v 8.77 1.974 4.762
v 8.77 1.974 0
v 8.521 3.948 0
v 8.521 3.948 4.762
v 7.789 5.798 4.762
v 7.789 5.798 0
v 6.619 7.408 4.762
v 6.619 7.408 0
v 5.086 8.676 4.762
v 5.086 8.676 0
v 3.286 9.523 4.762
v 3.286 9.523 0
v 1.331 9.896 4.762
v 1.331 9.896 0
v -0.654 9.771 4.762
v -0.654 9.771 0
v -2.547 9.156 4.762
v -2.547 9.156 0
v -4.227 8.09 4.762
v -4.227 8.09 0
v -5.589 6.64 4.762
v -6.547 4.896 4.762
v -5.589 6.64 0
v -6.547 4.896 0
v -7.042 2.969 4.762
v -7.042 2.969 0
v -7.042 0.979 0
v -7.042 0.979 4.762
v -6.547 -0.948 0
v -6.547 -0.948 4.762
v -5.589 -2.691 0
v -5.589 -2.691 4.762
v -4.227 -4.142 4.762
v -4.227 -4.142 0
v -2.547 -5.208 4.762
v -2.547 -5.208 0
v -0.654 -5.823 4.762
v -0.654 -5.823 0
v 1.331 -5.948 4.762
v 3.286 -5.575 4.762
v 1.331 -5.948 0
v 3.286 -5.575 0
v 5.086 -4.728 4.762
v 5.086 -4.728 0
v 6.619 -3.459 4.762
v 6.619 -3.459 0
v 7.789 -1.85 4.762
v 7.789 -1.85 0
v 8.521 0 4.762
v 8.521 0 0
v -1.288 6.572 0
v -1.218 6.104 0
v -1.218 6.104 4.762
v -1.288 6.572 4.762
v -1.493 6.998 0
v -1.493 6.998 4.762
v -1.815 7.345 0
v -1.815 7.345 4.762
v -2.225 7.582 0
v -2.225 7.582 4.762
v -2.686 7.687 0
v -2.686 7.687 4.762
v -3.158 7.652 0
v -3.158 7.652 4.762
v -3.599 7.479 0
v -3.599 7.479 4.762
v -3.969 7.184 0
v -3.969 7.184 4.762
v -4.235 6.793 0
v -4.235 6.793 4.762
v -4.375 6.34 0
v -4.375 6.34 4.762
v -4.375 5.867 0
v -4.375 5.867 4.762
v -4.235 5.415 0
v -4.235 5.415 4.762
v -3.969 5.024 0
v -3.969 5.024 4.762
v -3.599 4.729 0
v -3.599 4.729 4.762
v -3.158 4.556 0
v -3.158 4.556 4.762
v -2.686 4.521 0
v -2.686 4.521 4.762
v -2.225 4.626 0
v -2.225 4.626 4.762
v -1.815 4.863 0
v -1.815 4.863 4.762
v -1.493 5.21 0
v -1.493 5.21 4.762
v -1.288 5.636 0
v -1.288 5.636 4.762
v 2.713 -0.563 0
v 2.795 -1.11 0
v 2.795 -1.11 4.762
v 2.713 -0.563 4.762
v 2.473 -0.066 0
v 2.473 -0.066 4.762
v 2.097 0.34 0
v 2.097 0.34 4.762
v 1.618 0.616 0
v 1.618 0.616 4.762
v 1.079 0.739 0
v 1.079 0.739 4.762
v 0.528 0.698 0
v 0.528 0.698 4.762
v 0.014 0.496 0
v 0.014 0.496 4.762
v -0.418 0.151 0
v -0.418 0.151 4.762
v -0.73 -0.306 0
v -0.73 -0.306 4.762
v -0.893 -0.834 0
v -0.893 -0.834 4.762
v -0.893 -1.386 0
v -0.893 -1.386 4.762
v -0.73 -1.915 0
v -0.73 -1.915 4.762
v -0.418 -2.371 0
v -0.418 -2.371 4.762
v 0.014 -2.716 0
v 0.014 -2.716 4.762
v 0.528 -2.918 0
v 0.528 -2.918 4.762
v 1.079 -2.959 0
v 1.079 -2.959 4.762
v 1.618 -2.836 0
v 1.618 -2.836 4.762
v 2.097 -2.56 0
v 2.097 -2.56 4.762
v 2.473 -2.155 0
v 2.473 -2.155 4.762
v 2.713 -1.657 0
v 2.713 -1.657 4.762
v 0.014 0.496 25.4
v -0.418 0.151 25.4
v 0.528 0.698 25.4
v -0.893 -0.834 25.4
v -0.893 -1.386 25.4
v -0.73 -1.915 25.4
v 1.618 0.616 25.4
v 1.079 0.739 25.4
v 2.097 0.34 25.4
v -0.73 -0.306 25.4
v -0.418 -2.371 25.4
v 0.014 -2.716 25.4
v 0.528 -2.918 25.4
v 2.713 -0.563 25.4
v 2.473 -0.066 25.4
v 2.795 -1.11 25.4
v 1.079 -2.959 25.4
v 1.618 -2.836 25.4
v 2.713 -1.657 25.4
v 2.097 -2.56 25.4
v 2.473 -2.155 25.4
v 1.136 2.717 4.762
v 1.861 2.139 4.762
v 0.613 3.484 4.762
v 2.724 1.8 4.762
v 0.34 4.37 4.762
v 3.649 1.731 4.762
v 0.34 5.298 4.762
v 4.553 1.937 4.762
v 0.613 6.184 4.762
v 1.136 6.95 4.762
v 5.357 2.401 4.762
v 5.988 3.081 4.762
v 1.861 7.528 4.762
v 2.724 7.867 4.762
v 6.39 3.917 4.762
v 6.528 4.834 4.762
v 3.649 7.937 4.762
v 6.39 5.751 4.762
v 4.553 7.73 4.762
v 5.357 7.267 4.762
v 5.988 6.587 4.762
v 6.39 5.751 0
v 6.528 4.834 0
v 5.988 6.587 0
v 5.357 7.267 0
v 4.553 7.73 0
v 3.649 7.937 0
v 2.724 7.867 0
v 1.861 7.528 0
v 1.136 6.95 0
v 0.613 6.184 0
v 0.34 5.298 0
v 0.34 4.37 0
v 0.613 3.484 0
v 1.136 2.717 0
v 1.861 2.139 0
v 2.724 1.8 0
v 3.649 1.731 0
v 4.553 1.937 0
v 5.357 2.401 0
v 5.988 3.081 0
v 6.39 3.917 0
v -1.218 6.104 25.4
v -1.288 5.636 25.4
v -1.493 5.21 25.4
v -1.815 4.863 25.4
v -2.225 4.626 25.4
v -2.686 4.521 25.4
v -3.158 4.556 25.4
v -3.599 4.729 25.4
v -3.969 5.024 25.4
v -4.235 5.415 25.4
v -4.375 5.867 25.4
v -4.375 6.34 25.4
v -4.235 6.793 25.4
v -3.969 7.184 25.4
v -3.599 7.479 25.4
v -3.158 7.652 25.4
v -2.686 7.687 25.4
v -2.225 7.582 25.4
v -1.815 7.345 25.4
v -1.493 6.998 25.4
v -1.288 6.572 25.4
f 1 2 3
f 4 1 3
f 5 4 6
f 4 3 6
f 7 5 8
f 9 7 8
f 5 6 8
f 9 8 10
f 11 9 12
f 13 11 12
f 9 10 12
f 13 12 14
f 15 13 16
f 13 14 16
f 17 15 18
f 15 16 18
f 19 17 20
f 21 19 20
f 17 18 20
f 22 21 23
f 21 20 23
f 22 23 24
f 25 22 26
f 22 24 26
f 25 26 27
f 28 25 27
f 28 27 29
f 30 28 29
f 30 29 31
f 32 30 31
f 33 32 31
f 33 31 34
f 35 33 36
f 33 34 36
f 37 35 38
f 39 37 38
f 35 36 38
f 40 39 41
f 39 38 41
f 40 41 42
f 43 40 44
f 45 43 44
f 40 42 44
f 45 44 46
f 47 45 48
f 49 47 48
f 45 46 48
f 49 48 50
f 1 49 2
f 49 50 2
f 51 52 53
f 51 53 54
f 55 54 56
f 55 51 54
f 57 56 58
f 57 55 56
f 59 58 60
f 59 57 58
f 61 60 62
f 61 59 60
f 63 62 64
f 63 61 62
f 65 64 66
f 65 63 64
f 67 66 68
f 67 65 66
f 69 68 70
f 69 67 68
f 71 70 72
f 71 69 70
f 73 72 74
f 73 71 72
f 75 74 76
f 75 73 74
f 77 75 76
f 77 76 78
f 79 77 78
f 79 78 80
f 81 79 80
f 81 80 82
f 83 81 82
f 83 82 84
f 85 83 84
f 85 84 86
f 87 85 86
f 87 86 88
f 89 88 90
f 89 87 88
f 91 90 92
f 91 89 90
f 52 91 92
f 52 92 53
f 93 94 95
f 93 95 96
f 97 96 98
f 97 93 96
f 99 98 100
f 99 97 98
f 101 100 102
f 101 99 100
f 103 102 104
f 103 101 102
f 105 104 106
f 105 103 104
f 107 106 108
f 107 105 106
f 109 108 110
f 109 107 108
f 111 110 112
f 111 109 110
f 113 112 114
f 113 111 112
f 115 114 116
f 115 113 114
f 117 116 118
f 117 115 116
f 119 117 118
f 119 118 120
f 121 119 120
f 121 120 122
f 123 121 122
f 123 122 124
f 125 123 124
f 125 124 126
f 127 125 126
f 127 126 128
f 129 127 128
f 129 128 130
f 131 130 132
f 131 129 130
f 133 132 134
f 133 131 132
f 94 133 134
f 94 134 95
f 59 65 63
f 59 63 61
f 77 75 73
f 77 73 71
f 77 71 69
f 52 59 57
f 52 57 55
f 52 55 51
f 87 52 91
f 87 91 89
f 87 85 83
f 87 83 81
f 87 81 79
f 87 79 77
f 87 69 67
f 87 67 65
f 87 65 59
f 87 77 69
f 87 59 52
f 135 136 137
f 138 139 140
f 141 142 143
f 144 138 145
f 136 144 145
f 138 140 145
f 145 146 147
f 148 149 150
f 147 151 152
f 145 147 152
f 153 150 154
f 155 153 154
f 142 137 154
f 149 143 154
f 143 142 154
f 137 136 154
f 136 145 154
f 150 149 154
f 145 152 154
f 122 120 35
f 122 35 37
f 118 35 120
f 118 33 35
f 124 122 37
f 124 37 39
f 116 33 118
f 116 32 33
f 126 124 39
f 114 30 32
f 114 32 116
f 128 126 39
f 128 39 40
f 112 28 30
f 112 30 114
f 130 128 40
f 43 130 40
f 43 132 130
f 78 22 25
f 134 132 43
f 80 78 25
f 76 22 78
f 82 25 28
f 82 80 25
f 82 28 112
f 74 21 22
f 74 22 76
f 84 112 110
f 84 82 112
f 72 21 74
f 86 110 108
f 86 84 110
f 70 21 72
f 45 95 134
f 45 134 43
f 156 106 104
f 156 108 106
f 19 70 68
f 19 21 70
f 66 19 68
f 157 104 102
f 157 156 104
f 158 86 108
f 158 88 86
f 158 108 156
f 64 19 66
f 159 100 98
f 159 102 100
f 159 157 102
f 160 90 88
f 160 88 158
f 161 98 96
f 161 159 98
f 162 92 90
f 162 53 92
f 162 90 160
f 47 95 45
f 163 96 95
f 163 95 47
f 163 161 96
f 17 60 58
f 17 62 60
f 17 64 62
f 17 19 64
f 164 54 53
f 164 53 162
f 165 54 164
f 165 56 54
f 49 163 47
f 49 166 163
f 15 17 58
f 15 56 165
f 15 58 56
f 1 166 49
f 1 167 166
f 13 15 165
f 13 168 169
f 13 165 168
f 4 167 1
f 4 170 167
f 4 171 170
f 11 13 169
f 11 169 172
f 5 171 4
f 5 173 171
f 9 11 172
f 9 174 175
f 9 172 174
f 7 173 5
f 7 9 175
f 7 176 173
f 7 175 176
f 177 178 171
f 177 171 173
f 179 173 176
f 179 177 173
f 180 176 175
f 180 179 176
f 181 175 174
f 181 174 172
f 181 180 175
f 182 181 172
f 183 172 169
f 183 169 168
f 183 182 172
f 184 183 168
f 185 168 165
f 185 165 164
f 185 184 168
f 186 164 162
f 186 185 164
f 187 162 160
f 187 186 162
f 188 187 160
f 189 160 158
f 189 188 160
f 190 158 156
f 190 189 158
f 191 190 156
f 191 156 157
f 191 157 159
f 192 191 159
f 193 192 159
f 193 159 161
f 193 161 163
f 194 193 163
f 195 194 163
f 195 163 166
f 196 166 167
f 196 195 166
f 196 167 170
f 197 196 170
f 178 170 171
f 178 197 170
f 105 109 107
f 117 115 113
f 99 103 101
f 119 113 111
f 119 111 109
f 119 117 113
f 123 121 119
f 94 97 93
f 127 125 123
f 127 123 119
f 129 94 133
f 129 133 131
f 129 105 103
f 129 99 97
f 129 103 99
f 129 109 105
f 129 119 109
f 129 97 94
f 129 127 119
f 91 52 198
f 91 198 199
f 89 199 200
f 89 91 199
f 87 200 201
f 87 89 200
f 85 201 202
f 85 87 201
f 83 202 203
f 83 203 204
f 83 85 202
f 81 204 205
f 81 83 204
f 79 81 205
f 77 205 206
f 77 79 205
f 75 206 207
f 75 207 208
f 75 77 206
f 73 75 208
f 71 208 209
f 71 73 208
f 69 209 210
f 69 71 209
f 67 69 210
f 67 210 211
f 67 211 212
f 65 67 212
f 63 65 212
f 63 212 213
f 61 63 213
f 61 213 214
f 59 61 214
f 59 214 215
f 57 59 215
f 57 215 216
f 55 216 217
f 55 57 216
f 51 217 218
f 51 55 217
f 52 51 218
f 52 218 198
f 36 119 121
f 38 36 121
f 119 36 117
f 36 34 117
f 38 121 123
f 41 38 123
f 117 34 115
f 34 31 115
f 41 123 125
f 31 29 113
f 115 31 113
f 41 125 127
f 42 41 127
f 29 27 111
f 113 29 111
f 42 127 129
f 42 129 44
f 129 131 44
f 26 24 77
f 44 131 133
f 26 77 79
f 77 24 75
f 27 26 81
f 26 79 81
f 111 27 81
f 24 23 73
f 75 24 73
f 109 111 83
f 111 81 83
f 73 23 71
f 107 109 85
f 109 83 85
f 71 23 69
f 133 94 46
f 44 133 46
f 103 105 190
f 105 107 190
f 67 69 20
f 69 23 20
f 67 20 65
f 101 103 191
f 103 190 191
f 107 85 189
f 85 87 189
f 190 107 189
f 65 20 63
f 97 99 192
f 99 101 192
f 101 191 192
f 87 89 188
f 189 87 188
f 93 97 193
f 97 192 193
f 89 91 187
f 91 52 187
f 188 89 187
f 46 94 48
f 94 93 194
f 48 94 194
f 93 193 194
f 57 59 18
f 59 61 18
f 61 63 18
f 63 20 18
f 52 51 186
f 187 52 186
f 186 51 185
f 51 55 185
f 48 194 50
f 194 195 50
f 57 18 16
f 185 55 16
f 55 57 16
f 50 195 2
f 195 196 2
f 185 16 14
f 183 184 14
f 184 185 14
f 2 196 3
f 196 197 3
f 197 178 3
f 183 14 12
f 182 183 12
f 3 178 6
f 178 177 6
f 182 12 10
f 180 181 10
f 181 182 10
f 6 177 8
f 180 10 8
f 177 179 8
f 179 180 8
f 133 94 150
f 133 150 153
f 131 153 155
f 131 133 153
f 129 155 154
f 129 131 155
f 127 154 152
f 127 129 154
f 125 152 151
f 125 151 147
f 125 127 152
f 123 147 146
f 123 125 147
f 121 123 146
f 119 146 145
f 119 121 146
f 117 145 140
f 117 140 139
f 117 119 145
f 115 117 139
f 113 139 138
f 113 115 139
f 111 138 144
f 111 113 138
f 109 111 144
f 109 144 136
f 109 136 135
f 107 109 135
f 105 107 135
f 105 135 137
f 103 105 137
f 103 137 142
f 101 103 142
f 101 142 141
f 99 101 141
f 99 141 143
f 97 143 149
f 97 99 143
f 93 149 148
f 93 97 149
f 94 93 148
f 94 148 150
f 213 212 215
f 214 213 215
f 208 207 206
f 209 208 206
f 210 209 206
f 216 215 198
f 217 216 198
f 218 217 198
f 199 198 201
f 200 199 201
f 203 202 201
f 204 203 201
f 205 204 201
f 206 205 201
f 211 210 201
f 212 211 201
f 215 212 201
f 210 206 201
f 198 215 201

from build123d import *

# Parameters (mm, degrees)
F1_R     = 7.9375
F1_R_2   = 1.8542
F1_R_3   = 1.5875
F1_R_4   = 3.1115
F2_DEPTH = 4.7625
F3_R     = 1.5875
F3_R_2   = 1.8542
F4_DEPTH = 25.4


with BuildPart() as f2:
    # F1 (on Top) → F2 (new body)
    with BuildSketch(Plane.XY):
        with Locations((0.832931, 1.974197)):
            Circle(F1_R)
        with Locations((0.940828, -1.110016)):
            Circle(F1_R_2, mode=Mode.SUBTRACT)
        with Locations((-2.805024, 6.103854)):
            Circle(F1_R_3, mode=Mode.SUBTRACT)
        with Locations((3.41668, 4.833854)):
            Circle(F1_R_4, mode=Mode.SUBTRACT)
    extrude(amount=F2_DEPTH)


with BuildPart() as f4:
    # F3 (on face) → F4 (new body)
    with BuildSketch(Plane(origin=(0, 0, 0), x_dir=(1, 0, 0), z_dir=(0, 0, -1))):
        with Locations((-2.805024, -6.103854)):
            Circle(F3_R)
        with Locations((0.940828, 1.110016)):
            Circle(F3_R_2)
    extrude(amount=-F4_DEPTH)


solid = Compound([f2.part, f4.part])
